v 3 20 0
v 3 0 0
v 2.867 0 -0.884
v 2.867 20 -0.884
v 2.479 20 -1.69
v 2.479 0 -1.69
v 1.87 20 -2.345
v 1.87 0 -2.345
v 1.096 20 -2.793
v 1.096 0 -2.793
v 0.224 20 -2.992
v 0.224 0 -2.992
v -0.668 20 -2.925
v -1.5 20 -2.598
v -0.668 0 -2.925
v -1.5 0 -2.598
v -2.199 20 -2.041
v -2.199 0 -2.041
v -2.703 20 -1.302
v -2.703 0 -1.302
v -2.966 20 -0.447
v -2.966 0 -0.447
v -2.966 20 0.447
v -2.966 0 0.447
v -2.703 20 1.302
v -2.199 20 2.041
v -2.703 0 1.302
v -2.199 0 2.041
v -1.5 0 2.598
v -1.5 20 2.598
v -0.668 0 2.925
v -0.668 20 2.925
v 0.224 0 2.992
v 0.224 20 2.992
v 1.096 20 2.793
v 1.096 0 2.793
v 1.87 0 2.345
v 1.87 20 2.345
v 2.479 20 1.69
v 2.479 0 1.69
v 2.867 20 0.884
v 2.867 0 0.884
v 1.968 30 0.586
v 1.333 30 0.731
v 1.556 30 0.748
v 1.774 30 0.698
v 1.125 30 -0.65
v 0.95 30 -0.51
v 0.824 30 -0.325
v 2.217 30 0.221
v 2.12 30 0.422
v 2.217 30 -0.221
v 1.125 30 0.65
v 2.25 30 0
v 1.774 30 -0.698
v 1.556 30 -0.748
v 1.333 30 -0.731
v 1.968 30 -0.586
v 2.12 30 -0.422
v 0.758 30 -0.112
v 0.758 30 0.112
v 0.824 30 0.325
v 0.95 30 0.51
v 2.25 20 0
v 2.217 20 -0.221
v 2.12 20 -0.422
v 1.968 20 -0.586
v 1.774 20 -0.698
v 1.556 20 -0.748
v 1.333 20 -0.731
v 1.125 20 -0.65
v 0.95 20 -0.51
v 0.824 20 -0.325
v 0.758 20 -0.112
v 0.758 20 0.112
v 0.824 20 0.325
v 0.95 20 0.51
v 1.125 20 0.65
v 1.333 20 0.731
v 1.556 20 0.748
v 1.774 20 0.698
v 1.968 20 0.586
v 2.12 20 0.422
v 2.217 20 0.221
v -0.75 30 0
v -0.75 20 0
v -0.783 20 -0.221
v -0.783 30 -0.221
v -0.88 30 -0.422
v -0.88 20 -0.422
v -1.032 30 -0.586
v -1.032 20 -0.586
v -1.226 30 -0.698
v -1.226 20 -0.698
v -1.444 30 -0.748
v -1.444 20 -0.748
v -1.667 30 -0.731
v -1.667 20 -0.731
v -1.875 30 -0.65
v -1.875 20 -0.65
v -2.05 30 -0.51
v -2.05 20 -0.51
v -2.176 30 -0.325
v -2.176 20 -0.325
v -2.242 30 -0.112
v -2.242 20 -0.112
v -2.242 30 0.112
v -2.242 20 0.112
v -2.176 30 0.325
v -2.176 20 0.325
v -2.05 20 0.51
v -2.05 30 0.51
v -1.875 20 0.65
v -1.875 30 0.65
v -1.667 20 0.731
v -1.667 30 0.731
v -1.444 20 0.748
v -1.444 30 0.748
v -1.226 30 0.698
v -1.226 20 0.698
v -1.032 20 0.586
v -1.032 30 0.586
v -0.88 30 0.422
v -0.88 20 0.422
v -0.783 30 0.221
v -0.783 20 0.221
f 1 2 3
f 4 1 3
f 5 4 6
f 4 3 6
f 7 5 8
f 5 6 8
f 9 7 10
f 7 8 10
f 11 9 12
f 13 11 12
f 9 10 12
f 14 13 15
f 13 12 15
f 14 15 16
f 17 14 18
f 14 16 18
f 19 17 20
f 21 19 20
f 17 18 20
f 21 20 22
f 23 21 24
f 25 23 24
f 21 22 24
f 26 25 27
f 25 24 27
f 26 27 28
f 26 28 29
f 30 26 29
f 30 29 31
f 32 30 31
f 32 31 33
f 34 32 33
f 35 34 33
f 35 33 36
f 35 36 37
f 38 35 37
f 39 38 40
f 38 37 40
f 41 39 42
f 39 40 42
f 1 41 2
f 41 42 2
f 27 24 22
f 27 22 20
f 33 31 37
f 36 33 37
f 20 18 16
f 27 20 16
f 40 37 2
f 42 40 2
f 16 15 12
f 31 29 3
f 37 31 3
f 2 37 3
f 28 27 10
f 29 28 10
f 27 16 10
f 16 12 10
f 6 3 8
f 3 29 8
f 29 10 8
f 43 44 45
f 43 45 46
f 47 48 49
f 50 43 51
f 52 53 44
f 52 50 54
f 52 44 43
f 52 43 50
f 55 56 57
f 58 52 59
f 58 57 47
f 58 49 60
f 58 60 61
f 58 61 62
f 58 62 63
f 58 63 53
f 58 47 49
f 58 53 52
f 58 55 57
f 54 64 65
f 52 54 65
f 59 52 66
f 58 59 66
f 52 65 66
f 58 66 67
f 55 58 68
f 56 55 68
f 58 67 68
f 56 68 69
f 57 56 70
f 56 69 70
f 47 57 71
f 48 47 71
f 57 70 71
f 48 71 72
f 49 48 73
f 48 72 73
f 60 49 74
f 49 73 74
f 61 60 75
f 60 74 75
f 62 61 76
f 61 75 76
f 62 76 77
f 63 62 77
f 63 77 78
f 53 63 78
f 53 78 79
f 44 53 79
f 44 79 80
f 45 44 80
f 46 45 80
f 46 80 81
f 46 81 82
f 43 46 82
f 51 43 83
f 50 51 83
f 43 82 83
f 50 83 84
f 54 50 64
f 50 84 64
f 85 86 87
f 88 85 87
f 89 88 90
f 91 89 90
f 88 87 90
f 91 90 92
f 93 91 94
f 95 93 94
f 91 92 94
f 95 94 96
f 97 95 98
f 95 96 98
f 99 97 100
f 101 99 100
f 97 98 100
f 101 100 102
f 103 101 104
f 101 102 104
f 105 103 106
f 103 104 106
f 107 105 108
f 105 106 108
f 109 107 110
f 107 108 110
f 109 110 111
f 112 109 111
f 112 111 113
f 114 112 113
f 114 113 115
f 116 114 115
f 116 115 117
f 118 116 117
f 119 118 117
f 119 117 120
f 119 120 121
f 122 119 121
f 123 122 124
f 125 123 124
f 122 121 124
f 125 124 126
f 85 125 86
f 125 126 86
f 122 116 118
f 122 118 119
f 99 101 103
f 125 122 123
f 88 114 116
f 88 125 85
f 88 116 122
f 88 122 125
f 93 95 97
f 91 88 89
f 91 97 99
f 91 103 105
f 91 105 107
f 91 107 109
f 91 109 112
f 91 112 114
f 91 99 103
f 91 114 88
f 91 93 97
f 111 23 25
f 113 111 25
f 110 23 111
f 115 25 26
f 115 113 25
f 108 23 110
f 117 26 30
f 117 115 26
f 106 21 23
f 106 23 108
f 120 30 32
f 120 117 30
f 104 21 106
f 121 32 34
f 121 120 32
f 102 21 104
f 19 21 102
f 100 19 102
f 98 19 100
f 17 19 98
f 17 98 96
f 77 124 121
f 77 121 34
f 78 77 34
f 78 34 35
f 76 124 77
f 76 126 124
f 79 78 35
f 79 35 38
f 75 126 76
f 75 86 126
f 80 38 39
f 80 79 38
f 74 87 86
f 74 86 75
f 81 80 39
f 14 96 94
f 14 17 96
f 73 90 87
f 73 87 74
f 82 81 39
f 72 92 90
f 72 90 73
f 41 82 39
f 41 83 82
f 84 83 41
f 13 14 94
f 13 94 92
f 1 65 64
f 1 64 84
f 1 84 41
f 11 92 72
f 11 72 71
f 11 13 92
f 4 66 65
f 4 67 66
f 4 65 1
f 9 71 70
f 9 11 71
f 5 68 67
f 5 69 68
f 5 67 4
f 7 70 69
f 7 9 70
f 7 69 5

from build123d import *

# Parameters (mm, degrees)
SKETCH1_R           = 3
BOSS_EXTRUDE1_DEPTH = 20
SKETCH2_R           = 0.75
BOSS_EXTRUDE2_DEPTH = 10


with BuildPart() as part:
    # Sketch1 → Boss-Extrude1 (new body)
    with BuildSketch(Plane(origin=(0, 0, 0), x_dir=(1, 0, 0), z_dir=(0, 1, 0))):
        Circle(SKETCH1_R)
    extrude(amount=BOSS_EXTRUDE1_DEPTH)

    # Sketch2 → Boss-Extrude2 (add)
    with BuildSketch(Plane(origin=(0, 20, 0), x_dir=(1, 0, 0), z_dir=(0, 1, 0))):
        with Locations((1.5, 0)):
            Circle(SKETCH2_R)
        with Locations((-1.5, 0)):
            Circle(SKETCH2_R)
    extrude(amount=BOSS_EXTRUDE2_DEPTH)


solid = part.part
